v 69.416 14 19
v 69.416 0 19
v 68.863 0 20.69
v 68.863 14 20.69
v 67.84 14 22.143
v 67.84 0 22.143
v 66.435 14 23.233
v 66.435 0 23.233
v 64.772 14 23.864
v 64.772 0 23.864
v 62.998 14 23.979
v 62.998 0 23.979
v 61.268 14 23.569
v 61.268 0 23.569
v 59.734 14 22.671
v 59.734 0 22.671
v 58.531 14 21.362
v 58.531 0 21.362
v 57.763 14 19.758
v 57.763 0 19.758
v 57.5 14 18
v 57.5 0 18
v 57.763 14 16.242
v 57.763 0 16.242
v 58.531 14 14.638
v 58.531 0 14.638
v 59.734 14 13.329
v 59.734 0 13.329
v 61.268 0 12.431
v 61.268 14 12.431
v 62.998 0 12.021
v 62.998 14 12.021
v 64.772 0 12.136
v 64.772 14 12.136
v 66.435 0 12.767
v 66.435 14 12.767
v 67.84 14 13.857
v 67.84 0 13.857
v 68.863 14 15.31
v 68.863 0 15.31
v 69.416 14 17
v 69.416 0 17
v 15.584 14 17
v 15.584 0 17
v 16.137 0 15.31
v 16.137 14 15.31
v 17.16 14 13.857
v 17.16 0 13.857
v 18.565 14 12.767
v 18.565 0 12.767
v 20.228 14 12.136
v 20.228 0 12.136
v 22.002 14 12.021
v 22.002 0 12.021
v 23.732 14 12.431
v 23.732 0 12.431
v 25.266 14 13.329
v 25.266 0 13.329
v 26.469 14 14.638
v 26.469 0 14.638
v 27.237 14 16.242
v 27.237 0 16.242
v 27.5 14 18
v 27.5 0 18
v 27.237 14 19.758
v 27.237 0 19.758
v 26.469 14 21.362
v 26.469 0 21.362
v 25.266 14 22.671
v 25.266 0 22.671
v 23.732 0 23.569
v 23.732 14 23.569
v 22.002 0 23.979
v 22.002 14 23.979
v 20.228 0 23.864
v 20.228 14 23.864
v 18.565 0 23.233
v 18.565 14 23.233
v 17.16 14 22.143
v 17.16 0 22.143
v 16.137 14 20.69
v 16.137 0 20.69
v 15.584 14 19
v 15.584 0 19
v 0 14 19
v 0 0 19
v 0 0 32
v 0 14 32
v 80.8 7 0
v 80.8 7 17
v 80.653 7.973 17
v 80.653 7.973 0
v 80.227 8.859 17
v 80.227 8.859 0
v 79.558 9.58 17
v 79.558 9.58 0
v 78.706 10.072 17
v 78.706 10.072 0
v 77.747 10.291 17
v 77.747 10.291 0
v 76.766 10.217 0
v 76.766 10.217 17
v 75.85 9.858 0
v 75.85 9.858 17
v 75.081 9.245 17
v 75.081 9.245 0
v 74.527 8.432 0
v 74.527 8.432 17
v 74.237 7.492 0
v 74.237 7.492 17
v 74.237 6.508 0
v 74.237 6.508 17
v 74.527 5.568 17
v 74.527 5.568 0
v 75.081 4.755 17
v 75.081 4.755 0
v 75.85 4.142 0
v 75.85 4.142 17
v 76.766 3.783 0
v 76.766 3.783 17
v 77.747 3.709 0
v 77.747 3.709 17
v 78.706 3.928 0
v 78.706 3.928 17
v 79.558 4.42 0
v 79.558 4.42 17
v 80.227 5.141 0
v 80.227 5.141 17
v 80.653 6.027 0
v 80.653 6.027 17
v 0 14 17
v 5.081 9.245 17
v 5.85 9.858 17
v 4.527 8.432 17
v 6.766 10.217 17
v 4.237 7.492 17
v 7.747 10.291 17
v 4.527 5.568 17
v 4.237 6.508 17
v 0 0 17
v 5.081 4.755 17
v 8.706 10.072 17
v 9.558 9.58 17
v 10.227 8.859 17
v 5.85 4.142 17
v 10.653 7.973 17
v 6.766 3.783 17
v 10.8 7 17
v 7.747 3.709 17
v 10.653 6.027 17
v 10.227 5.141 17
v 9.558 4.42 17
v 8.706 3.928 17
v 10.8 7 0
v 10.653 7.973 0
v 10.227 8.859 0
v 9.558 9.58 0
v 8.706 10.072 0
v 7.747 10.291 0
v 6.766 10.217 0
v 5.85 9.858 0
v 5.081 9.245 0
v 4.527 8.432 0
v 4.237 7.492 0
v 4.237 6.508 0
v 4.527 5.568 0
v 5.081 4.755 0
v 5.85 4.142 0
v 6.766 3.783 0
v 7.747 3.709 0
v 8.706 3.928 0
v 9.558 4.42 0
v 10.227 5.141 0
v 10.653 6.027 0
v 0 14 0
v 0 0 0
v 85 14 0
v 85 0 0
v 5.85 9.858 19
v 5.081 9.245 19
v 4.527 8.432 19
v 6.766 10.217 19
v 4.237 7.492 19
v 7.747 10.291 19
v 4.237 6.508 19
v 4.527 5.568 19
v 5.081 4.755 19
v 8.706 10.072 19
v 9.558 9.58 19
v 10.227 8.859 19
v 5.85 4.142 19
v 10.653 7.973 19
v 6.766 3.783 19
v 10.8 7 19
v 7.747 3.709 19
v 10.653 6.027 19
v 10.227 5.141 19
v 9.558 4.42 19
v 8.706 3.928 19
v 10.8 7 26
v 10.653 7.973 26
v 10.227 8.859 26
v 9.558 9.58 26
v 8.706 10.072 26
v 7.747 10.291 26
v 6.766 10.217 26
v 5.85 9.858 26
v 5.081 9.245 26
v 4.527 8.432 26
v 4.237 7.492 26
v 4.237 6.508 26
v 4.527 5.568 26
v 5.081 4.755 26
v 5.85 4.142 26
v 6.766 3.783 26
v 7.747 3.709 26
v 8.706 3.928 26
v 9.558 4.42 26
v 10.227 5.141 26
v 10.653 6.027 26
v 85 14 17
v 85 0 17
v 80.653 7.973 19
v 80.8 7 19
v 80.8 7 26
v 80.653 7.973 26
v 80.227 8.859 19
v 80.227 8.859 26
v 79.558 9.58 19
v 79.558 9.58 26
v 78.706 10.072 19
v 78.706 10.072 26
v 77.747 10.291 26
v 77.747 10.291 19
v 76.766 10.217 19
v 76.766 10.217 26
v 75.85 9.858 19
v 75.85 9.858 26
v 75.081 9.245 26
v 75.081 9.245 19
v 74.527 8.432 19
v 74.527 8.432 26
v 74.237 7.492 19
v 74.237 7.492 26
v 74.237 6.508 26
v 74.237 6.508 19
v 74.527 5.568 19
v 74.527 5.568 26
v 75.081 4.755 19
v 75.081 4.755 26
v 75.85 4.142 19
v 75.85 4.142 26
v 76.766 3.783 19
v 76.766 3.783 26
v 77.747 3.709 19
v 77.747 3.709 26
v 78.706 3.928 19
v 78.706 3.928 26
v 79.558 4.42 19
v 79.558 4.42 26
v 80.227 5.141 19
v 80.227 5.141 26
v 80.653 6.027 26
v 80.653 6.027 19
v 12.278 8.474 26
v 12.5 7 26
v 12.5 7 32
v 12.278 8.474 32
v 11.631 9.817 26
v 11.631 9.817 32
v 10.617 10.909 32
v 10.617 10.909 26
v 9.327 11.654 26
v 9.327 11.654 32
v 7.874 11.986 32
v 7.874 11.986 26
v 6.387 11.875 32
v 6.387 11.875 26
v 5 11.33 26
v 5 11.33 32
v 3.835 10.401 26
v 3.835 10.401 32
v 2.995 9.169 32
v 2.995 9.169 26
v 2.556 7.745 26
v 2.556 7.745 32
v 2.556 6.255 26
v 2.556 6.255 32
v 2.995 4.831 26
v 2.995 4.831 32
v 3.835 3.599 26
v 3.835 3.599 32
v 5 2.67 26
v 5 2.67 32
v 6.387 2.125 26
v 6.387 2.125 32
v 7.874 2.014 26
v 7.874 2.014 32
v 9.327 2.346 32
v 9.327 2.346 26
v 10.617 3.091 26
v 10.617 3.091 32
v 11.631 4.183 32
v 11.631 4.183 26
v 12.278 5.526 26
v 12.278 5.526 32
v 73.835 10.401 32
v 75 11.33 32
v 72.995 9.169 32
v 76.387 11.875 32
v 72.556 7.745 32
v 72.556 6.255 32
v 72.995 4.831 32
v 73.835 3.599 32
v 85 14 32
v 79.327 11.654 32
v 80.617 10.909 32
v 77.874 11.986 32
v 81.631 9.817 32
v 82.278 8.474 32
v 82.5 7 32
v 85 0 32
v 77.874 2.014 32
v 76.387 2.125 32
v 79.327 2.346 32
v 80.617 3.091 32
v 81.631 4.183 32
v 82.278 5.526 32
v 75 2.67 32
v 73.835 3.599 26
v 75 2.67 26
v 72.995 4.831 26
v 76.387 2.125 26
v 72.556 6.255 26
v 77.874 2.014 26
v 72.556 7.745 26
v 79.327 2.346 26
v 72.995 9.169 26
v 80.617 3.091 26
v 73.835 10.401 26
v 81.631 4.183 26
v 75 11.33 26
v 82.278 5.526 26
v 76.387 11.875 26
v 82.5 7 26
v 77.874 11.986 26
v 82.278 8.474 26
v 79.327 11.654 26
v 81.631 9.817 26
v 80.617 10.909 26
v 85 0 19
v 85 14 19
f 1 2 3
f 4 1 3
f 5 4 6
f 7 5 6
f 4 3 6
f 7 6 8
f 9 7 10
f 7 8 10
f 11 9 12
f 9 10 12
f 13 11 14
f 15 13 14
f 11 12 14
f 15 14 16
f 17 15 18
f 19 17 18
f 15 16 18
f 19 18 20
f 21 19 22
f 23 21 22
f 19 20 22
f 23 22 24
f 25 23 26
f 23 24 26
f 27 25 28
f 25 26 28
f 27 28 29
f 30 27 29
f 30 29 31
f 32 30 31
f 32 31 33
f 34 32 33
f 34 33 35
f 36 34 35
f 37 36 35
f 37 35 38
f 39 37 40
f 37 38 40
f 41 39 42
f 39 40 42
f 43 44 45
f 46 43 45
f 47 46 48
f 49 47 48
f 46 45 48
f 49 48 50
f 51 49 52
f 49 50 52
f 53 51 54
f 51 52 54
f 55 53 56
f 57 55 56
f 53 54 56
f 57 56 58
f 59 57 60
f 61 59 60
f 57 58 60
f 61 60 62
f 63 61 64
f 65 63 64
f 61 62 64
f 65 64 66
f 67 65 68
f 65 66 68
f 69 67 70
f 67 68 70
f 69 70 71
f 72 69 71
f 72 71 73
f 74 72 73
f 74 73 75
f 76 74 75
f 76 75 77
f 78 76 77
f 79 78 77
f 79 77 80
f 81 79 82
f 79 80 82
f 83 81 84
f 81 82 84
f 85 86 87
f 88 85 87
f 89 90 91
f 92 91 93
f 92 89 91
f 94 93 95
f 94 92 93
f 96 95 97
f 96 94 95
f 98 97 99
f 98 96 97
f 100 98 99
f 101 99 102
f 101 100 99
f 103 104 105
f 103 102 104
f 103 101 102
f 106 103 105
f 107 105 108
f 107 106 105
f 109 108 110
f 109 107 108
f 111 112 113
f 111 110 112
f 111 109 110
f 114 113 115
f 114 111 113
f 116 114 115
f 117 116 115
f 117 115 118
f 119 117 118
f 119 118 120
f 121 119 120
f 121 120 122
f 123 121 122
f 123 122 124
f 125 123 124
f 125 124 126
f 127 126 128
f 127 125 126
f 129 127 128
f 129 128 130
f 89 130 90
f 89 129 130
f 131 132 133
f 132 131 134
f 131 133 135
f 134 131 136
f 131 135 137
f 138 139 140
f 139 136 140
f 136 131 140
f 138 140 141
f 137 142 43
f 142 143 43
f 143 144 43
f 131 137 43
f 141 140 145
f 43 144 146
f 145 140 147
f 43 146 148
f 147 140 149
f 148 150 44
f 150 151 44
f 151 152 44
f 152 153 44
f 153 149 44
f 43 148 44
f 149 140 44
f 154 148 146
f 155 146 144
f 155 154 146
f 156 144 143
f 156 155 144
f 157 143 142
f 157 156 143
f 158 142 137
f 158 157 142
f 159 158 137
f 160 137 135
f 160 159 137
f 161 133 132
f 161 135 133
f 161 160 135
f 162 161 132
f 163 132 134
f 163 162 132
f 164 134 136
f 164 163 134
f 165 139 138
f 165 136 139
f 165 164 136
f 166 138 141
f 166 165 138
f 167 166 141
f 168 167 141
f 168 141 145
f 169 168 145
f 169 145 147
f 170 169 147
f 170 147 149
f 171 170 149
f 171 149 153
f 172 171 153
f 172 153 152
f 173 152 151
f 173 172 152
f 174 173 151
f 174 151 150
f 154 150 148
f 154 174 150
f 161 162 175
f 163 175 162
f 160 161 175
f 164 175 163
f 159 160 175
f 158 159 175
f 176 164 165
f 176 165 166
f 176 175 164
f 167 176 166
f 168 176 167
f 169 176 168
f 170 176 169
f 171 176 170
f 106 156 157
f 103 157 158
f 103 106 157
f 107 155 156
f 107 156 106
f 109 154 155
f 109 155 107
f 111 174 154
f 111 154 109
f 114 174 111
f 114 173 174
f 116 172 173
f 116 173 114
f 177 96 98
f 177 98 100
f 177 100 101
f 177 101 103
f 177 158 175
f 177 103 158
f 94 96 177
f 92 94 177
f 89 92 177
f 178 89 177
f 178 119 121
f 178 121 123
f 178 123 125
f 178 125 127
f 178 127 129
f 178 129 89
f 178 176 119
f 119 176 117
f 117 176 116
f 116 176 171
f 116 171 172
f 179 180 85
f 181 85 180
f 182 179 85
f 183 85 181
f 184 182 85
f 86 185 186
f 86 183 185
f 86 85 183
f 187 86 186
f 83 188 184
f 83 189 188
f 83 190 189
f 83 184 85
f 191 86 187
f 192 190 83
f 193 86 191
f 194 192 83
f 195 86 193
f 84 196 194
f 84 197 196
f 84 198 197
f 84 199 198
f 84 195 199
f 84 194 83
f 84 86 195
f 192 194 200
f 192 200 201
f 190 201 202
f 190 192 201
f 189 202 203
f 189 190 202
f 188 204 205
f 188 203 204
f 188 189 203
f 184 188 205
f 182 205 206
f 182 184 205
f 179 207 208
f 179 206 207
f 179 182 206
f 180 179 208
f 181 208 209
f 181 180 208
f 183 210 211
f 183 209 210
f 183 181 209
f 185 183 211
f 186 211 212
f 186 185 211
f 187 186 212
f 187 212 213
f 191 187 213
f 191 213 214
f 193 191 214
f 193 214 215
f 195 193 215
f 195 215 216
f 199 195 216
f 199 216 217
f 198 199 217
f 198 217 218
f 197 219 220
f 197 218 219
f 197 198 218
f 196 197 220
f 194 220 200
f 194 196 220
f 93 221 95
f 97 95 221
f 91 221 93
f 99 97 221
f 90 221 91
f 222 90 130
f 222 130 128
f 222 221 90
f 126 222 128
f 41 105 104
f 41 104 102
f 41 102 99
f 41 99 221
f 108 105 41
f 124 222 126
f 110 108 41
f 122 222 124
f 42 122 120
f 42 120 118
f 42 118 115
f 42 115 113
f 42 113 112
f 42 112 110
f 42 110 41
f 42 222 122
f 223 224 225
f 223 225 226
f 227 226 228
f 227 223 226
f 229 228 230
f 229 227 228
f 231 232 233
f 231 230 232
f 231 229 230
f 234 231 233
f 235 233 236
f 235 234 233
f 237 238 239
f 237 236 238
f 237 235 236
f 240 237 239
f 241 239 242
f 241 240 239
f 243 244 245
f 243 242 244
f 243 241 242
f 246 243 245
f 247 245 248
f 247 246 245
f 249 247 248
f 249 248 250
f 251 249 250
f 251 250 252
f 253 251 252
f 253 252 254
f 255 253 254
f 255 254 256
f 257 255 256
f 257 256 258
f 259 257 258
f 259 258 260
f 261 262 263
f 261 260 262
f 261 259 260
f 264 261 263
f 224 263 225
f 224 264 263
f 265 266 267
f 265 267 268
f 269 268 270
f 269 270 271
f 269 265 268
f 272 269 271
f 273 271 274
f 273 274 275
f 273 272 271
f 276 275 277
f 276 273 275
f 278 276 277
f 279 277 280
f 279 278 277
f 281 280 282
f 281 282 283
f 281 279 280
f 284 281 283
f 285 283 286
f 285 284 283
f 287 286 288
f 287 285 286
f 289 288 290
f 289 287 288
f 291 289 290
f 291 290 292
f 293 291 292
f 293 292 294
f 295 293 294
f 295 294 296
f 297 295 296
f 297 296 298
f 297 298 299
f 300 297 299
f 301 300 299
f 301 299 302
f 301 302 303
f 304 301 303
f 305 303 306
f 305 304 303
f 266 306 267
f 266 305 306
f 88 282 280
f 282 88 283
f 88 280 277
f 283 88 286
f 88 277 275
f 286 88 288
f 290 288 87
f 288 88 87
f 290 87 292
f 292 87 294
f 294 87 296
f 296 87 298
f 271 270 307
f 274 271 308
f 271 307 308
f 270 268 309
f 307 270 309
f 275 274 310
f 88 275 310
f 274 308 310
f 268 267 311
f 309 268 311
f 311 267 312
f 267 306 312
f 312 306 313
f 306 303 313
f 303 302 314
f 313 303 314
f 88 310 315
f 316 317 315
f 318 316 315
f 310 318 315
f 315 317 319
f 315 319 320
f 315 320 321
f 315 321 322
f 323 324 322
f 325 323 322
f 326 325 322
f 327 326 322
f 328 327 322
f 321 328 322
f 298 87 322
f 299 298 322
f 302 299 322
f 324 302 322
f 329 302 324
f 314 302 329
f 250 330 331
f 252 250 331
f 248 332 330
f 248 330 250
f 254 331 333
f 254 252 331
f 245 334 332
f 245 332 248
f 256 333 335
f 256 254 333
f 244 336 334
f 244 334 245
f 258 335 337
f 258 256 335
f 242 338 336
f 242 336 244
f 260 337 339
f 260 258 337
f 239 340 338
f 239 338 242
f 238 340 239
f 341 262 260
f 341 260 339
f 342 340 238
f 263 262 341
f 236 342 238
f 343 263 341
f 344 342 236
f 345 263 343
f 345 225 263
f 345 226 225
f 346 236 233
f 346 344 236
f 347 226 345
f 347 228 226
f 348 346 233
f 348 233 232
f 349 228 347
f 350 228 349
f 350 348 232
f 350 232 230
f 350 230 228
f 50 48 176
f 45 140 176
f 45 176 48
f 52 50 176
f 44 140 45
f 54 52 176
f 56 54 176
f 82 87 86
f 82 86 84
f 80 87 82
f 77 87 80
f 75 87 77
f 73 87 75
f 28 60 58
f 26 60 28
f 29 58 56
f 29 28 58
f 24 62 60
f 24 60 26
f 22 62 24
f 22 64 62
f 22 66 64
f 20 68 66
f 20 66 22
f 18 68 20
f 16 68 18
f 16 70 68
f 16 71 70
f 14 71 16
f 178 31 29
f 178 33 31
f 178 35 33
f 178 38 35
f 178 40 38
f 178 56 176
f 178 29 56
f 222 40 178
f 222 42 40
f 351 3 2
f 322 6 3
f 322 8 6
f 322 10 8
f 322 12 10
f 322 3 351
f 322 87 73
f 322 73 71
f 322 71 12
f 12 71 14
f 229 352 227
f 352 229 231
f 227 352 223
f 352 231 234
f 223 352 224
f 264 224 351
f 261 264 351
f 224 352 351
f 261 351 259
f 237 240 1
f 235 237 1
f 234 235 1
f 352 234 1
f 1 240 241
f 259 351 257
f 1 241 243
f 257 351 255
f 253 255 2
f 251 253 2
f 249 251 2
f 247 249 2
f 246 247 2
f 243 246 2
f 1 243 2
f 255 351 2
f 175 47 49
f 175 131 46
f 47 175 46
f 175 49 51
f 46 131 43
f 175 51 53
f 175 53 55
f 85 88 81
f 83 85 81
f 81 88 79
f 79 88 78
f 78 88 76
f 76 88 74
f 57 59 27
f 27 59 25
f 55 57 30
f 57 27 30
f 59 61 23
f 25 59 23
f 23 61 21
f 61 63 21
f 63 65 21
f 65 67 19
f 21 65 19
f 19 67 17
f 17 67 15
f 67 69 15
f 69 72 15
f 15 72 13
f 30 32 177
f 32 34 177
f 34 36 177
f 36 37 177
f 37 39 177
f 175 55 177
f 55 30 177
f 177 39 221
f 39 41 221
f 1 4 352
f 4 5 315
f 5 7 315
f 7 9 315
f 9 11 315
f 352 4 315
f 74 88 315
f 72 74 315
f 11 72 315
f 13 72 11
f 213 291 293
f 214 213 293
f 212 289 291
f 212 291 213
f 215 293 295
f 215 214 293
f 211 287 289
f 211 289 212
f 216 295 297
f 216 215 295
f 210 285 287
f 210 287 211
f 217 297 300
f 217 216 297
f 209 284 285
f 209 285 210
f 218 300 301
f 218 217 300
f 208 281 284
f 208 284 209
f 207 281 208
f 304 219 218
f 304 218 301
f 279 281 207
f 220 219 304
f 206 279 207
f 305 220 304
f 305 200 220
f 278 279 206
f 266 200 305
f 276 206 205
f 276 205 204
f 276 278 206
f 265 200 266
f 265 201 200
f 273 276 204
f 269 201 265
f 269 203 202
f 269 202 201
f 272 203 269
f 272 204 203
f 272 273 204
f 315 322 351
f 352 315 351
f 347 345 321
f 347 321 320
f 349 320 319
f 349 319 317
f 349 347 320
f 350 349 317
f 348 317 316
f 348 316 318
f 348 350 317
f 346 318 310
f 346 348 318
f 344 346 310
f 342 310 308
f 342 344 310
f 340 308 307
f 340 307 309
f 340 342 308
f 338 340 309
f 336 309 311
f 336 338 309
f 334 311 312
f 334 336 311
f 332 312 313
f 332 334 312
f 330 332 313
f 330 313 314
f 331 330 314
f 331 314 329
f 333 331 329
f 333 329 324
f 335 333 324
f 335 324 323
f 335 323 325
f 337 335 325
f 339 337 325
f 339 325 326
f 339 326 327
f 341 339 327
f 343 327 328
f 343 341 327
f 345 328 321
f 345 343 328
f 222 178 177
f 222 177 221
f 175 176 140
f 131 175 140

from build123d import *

# Parameters (mm, degrees)
CYLINDER002_R     = 3.3
CYLINDER002_DEPTH = 28
CYLINDER003_R     = 5
CYLINDER003_DEPTH = 6
CYLINDER_R        = 3.3
CYLINDER_DEPTH    = 28
CYLINDER001_R     = 5
CYLINDER001_DEPTH = 6
PAD_DEPTH         = 14


with BuildPart() as cilindro002:
    # Cylinder002 → Cylinder002 (new body)
    with BuildSketch(Plane.XY):
        Circle(CYLINDER002_R)
    extrude(amount=CYLINDER002_DEPTH)


with BuildPart() as tornillo_dcho:
    # Cylinder003 → Cylinder003 (new body)
    with BuildSketch(Plane.XY.offset(26)):
        Circle(CYLINDER003_R)
    extrude(amount=CYLINDER003_DEPTH)

    # Fusion001: union Cilindro002
    add(cilindro002.part)


with BuildPart() as tornillo_dcho_1:
    # Fusion001 placement: moved
    add(tornillo_dcho.part.moved(Location((77.5, 7, 0))))


with BuildPart() as cilindro:
    # Cylinder → Cylinder (new body)
    with BuildSketch(Plane.XY):
        Circle(CYLINDER_R)
    extrude(amount=CYLINDER_DEPTH)


with BuildPart() as tornillos_m6:
    # Cylinder001 → Cylinder001 (new body)
    with BuildSketch(Plane.XY.offset(26)):
        Circle(CYLINDER001_R)
    extrude(amount=CYLINDER001_DEPTH)

    # Fusion: union Cilindro
    add(cilindro.part)


with BuildPart() as tornillos_m6_1:
    # Fusion placement: moved
    add(tornillos_m6.part.moved(Location((7.5, 7, 0))))

    # Fusion002: union Tornillo Dcho
    add(tornillo_dcho_1.part)


with BuildPart() as kta12_m6:
    # Sketch → Pad (new body)
    with BuildSketch(Plane.XZ):
        with BuildLine():
            Line((0, 0), (85, 0))
            Line((85, 0), (85, 17))
            Line((85, 17), (69.41608, 17))
            ThreePointArc((69.41608, 19), (57.5, 18), (69.41608, 17))
            Line((85, 19), (69.41608, 19))
            Line((85, 32), (85, 19))
            Line((0, 32), (85, 32))
            Line((0, 19), (0, 32))
            Line((0, 19), (15.58392, 19))
            ThreePointArc((15.58392, 17), (27.5, 18), (15.58392, 19))
            Line((0, 17), (15.58392, 17))
            Line((0, 0), (0, 17))
        make_face()
    extrude(amount=-PAD_DEPTH)

    # Cut: cut Tornillos_M6
    add(tornillos_m6_1.part, mode=Mode.SUBTRACT)


solid = kta12_m6.part
